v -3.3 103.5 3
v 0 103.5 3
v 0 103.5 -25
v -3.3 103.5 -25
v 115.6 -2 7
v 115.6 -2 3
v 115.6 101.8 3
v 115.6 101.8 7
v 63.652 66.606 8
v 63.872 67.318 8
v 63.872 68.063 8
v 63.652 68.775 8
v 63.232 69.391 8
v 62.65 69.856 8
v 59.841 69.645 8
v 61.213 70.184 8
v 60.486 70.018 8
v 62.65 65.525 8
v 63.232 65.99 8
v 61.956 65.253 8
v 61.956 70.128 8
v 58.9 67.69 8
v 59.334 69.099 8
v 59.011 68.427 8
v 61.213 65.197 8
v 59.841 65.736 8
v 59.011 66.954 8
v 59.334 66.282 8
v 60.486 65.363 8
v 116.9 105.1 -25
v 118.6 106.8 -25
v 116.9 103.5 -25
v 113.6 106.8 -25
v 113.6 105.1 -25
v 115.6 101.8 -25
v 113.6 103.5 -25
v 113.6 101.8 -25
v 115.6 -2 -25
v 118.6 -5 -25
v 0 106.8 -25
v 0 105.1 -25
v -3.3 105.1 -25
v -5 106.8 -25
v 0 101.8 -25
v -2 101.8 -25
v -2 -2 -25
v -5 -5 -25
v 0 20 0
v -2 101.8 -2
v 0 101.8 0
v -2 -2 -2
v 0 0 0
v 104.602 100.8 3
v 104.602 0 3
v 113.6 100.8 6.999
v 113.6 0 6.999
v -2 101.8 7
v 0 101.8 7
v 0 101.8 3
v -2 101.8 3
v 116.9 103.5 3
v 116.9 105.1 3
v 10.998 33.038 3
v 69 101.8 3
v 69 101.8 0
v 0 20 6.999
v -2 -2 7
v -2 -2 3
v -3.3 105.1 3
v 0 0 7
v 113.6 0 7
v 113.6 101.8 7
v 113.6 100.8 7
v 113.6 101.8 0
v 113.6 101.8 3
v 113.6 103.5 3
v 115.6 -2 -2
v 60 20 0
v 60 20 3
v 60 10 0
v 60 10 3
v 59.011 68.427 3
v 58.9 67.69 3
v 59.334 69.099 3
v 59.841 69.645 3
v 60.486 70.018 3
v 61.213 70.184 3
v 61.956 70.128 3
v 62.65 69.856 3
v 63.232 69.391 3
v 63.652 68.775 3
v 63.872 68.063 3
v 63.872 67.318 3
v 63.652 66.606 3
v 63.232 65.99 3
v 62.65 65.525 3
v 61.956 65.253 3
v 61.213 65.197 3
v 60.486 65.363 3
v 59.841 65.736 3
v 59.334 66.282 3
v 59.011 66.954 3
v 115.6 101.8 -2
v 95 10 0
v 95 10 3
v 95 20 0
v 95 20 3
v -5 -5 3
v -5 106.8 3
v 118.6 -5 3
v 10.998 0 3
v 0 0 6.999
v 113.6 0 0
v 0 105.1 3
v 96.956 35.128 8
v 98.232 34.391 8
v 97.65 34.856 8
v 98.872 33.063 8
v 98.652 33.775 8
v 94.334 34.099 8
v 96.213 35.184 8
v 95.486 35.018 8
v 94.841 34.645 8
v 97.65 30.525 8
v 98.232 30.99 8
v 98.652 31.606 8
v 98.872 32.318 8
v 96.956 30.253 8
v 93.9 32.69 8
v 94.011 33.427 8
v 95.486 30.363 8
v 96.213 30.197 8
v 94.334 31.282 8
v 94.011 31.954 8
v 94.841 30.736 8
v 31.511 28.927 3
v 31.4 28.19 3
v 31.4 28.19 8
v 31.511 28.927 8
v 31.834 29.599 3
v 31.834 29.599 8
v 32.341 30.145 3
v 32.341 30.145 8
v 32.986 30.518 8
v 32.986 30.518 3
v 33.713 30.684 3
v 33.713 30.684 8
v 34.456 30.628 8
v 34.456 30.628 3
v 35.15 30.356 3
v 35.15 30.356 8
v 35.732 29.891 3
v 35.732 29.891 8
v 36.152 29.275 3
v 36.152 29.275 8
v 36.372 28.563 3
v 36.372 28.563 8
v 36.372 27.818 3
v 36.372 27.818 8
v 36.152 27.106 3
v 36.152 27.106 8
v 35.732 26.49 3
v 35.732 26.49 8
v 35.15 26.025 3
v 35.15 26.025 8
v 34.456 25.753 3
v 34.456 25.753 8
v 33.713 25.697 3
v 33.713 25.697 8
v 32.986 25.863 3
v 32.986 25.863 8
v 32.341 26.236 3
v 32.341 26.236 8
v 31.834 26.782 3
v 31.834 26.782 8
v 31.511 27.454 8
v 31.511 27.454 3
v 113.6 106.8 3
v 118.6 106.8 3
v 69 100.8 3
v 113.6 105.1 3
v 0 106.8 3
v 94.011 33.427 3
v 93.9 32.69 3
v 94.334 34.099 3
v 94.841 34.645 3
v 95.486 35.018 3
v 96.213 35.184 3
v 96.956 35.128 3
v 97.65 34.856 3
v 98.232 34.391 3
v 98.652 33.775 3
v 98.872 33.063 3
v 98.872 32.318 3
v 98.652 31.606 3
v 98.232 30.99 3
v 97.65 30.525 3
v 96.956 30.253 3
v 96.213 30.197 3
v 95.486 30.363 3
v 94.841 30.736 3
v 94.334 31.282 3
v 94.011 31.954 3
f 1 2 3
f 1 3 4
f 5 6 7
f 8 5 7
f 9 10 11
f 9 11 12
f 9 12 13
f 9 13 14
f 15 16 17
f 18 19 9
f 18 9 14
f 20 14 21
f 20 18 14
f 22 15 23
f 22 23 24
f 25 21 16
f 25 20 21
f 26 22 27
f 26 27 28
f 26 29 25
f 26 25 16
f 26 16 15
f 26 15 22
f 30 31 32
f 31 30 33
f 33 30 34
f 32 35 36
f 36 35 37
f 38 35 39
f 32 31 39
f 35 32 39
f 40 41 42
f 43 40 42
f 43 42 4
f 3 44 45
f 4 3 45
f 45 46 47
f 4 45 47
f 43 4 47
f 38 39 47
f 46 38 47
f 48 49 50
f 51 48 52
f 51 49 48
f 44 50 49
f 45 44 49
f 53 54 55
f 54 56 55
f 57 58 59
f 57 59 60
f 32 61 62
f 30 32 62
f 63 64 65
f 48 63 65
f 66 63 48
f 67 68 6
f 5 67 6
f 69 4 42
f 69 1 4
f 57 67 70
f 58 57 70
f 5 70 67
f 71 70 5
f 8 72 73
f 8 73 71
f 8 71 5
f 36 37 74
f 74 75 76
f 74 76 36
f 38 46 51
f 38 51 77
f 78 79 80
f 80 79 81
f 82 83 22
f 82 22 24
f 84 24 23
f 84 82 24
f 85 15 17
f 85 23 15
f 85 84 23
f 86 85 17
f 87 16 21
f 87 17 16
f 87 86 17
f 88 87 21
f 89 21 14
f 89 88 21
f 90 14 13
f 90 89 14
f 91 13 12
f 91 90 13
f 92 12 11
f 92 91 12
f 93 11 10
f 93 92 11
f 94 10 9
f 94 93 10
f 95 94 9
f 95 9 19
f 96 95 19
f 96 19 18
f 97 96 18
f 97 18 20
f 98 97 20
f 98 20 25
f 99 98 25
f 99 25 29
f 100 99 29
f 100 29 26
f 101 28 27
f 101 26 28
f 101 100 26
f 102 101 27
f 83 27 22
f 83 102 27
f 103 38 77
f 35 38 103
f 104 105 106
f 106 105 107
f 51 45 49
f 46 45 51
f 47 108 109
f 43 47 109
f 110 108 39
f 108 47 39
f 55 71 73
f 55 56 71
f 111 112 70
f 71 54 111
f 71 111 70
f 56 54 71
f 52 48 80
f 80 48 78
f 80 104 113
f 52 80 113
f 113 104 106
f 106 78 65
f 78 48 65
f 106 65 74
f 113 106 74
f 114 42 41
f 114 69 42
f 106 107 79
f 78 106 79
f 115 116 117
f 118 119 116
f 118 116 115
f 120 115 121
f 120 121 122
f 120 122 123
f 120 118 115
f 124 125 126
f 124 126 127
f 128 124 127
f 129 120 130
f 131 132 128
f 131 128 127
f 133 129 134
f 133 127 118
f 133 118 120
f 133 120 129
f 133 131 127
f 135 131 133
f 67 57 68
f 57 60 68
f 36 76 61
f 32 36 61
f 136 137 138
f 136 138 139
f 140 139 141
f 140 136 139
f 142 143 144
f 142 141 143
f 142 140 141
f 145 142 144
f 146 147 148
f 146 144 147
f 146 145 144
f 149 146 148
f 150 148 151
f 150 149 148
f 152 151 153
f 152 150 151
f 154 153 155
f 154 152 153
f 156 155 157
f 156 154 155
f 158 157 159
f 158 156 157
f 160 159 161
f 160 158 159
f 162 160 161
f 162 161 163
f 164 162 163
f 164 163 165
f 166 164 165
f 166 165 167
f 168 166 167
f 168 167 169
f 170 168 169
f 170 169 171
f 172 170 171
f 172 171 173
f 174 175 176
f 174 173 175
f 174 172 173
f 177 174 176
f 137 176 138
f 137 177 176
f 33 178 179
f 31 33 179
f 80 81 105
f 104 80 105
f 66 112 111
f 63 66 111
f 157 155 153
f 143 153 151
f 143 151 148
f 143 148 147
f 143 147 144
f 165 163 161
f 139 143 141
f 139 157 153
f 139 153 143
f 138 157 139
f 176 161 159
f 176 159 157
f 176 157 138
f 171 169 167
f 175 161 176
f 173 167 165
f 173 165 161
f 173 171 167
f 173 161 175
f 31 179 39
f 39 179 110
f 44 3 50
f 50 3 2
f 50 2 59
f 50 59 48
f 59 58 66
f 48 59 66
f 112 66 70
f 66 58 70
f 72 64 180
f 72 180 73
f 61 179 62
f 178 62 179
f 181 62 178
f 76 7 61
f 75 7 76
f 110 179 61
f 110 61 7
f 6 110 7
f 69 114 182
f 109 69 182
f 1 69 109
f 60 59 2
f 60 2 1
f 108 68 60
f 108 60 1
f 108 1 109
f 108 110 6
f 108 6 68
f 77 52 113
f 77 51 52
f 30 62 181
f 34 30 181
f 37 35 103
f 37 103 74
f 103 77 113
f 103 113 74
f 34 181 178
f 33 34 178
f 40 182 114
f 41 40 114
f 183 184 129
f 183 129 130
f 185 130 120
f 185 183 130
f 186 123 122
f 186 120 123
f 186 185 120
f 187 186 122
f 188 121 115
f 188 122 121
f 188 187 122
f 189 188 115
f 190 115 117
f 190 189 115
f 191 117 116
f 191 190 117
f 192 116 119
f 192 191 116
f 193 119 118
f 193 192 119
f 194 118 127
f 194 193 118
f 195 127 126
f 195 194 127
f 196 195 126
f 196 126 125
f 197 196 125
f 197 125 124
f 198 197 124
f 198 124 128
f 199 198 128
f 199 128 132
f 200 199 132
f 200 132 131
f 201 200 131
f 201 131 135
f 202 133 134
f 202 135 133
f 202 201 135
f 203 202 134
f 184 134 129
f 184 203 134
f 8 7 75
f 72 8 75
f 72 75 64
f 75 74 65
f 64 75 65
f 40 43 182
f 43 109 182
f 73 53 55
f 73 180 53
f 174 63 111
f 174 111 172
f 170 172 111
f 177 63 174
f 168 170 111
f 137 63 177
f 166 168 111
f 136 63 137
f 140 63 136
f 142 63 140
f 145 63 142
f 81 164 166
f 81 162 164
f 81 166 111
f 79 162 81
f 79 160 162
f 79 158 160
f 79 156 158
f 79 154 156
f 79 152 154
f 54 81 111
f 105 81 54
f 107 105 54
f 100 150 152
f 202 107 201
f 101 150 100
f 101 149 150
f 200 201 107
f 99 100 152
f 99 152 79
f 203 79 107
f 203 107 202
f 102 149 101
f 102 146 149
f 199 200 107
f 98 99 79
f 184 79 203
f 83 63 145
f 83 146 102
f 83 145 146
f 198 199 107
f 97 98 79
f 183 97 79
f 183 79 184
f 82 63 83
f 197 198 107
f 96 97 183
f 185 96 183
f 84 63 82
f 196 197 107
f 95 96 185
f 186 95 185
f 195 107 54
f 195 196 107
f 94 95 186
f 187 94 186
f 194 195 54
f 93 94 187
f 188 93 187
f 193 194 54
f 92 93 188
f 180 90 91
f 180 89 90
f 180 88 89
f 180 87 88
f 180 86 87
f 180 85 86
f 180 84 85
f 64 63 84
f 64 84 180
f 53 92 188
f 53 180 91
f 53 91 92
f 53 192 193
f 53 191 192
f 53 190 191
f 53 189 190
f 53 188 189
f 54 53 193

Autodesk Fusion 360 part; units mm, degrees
sketch "Sketch1" plane through (0, 0, 0) normal (0, 0, 1) x (1, 0, 0)
  line L0 (0, 0) -> (113.6, 0)
  line L1 (113.6, 0) -> (113.6, 101.8)
  line L2 (113.6, 101.8) -> (0, 101.8)
  line L3 (0, 101.8) -> (0, 0)
  line L4 (-2, -2) -> (115.6, -2)
  line L5 (115.6, -2) -> (115.6, 103.8)
  line L6 (115.6, 103.8) -> (-2, 103.8)
  line L7 (-2, 103.8) -> (-2, -2)
  line L8 (-5, -5) -> (118.6, -5)
  line L9 (118.6, -5) -> (118.6, 106.8)
  line L10 (118.6, 106.8) -> (-5, 106.8)
  line L11 (-5, 106.8) -> (-5, -5)
  dimension "d1" = 113.6
  dimension "d2" = 101.8
  dimension "d3" = 2
  dimension "d4" = 5
extrude "Extrude1" add sketch "Sketch1" along normal blind 3 contours L0 L1 L2 L3
extrude "Extrude2" add sketch "Sketch1" along normal blind 7 contours L4 L5 L6 L7
extrude "Extrude3" add sketch "Sketch1" along normal blind 3 and the other way blind 25 contours L8 L9 L10 L11
sketch "Sketch2" plane through (0, 0, 3) normal (0, 0, 1) x (-1, 0, 0)
  line L0 (0, -101.8) -> (0, 0)
  line L1 (0, 0) -> (-113.6, 0)
  line L2 (-113.6, 0) -> (-113.6, -101.8)
  line L3 (-113.6, -101.8) -> (0, -101.8)
  line L4 (-69, -101.8) -> (0, -20)
  circle A0 centre (-61.3997, -67.6905) radius 2.5
  circle A1 centre (-61.3997, -67.6905) radius 2.5
  circle A2 centre (-96.3997, -32.6905) radius 2.5
  circle A3 centre (-33.8997, -28.1905) radius 2.5
  circle A4 centre (-33.8997, -28.1905) radius 2.5
  circle A5 centre (-96.3997, -32.6905) radius 2.5
  dimension "d15" = 5
  dimension "d16" = 34.1095
  dimension "d17" = 7.6003
  dimension "d18" = 44.6
  dimension "d19" = 20
  dimension "d20" = 5
  dimension "d21" = 5
  dimension "d22" = 17.2003
  dimension "d23" = 69.1095
  dimension "d24" = 33.8997
  dimension "d25" = 28.1905
extrude "Extrude4" cut sketch "Sketch2" against normal blind 3 contours L0 L3 L4
extrude "Extrude5" add sketch "Sketch2" along normal blind 5 contours A0 A1 | A2 A5 | A3 A4
sketch "Sketch3" plane through (0, 101.8, 0) normal (0, -1, 0) x (1, 0, 0)
  line L0 (69, 3) -> (113.6, 3)
  line L1 (113.6, 3) -> (113.6, 7)
  line L2 (113.6, 7) -> (0, 7)
  line L3 (0, 7) -> (0, 0)
  line L4 (0, 0) -> (69, 0)
  line L5 (69, 0) -> (69, 3)
  line L6 (69, 3) -> (113.6, 7)
extrude "Extrude6" add sketch "Sketch3" along normal blind 1 contours L0 L1 L6
sketch "Sketch4" plane through (0, 0, 3) normal (0, 0, 1) x (-1, 0, 0)
  line L0 (-69, -100.8) -> (-69, -101.8)
  line L1 (-69, -101.8) -> (0, -20)
  line L2 (0, -20) -> (0, 0)
  line L3 (0, 0) -> (-113.6, 0)
  line L4 (-113.6, 0) -> (-113.6, -100.8)
  line L5 (-113.6, -100.8) -> (-69, -100.8)
  circle A0 centre (-96.3997, -32.6905) radius 2.5
  circle A1 centre (-33.8997, -28.1905) radius 2.5
  circle A2 centre (-61.3997, -67.6905) radius 2.5
  line L6 (-95, -20) -> (-60, -20)
  line L7 (-60, -20) -> (-60, -10)
  line L8 (-60, -10) -> (-95, -10)
  line L9 (-95, -10) -> (-95, -20)
  dimension "d34" = 18.6
  dimension "d35" = 10
  dimension "d36" = 35
  dimension "d37" = 10
extrude "Extrude7" cut sketch "Sketch4" against normal blind 3 contours L6 L7 L8 L9
extrude "Extrude8" cut 1 faces at (77.4, 106.8, -15.6667) along direction (0, -1, 0) blind 5
extrude "Extrude9" cut 1 faces at (76.4, 103.8, 4.3333) along direction (0, -1, 0) blind 2
chamfer "Chamfer1" distance 2 angle 45 3 edges at (115.6, 49.9, 0) (56.8, -2, 0) (-2, 49.9, 0)
chamfer "Chamfer2" distance 9 distance2 4 1 edges at (113.6, 50.4, 3) measured on face at (91.362, 67.8914, 3)
chamfer "Chamfer3" distance 11 distance2 4 1 edges at (0, 10, 3) measured on face at (88.3626, 67.8914, 3)
sketch "Sketch6" plane through (0, 0, 7) normal (0, 0, 1) x (-1, 0, 0)
  line L0 (0, -101.8) -> (2, -101.8)
  line L1 (2, -101.8) -> (2, 2)
  line L2 (2, 2) -> (-115.6, 2)
  line L3 (-115.6, 2) -> (-115.6, -101.8)
  line L4 (-115.6, -101.8) -> (-113.6, -101.8)
  line L5 (-113.6, -101.8) -> (-113.6, -100.8)
  line L6 (-113.6, -100.8) -> (-113.6, 0)
  line L7 (-113.6, 0) -> (0, 0)
  line L8 (0, 0) -> (0, -20)
  line L9 (0, -20) -> (0, -101.8)
  line L10 (-118.6, -101.8) -> (-113.6, -101.8)
  line L11 (-113.6, -106.8) -> (-118.6, -106.8)
  line L12 (-118.6, -106.8) -> (-118.6, -101.8)
  line L13 (-113.6, -103.5) -> (-116.9, -103.5)
  line L14 (-116.9, -103.5) -> (-116.9, -105.1)
  line L15 (-116.9, -105.1) -> (-113.6, -105.1)
  line L16 (-113.6, -101.8) -> (-113.6, -103.5)
  line L17 (-113.6, -105.1) -> (-113.6, -106.8)
  line L18 (0, -101.8) -> (5, -101.8)
  line L19 (5, -101.8) -> (5, -106.8)
  line L20 (5, -106.8) -> (0, -106.8)
  line L21 (0, -103.5) -> (3.3, -103.5)
  line L22 (3.3, -103.5) -> (3.3, -105.1)
  line L23 (3.3, -105.1) -> (0, -105.1)
  line L24 (0, -106.8) -> (0, -105.1)
  line L25 (0, -103.5) -> (0, -101.8)
  dimension "d49" = 5
  dimension "d50" = 5
  dimension "d51" = 1.6
  dimension "d52" = 1.7
  dimension "d53" = 1.7
  dimension "d54" = 5
  dimension "d55" = 5
  dimension "d56" = 1.6
  dimension "d57" = 1.7
  dimension "d58" = 1.7
extrude "Extrude10" add sketch "Sketch6" against normal blind 32 contours L0 L18 L19 L20 L21 L22 L23 L24 L25 | L4 L10 L11 L12 L13 L14 L15 L16 L17
extrude "Extrude11" cut sketch "Sketch6" against normal blind 4 contours L0 L18 L19 L20 L21 L22 L23 L24 L25 | L4 L10 L11 L12 L13 L14 L15 L16 L17
